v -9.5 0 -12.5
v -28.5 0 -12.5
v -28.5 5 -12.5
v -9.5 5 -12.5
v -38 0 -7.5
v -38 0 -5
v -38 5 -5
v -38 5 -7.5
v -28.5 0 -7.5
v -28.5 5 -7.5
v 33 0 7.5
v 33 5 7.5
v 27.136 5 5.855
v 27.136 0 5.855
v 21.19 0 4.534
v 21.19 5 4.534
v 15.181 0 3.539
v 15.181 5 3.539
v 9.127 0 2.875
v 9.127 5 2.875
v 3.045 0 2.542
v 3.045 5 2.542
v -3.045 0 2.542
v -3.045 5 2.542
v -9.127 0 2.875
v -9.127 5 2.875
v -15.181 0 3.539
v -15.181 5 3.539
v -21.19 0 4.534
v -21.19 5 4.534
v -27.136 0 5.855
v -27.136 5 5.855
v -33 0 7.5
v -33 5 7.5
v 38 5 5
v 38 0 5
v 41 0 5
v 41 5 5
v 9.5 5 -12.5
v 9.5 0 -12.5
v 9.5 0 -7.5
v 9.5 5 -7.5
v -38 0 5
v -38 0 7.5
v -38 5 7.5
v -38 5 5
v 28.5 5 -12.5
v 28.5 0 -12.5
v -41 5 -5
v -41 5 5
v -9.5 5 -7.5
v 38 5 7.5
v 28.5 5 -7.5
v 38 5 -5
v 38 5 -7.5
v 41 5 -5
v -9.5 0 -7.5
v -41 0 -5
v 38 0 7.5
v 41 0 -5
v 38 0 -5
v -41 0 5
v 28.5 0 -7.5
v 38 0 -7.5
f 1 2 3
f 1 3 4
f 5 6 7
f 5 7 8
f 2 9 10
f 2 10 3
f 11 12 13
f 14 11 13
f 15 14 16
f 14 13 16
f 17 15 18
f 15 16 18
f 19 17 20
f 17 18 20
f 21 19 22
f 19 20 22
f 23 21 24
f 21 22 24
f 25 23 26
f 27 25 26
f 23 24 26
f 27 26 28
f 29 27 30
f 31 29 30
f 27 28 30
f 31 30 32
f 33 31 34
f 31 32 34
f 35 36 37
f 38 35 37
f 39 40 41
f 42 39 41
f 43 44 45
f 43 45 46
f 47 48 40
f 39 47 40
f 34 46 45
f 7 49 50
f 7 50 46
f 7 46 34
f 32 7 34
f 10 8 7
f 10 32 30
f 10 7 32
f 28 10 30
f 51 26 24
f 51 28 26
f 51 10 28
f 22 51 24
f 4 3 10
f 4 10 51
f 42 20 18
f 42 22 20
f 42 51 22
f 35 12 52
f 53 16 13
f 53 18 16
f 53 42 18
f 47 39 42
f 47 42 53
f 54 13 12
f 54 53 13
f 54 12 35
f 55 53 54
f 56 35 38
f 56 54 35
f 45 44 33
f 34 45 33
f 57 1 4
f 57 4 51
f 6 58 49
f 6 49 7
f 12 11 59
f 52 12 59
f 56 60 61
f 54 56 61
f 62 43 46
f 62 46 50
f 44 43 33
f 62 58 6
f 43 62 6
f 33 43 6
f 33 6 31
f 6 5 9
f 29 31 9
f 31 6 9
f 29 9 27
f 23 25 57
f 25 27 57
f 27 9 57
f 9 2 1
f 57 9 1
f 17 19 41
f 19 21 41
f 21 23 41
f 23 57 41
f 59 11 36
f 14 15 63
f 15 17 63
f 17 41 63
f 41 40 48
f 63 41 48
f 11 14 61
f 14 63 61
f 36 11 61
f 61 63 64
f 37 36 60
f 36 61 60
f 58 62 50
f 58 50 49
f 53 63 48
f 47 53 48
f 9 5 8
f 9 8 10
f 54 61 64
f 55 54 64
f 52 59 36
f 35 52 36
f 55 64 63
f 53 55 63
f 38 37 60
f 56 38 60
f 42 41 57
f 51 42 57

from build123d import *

# Parameters (mm, degrees)
BOSS_EXTRUDE1_DEPTH = 5
CUT_EXTRUDE1_DEPTH  = 44.153794735


with BuildPart() as part:
    # Sketch1 → Boss-Extrude1 (new body)
    with BuildSketch(Plane(origin=(0, 0, 0), x_dir=(1, 0, 0), z_dir=(0, 1, 0))):
        Polygon((-41, -5), (-41, 5), (-38, 5), (-38, 7.5), (-28.5, 7.5), (-28.5, 12.5), (-9.5, 12.5), (-9.5, 7.5), (0, 7.5), (0, -7.5), (-38, -7.5), (-38, -5), align=None)
    boss_extrude1 = extrude(amount=BOSS_EXTRUDE1_DEPTH)

    # Mirror1: Boss-Extrude1 across plane
    add(boss_extrude1.mirror(Plane(origin=(0, 5, -7.5), x_dir=(0, 0, 1), z_dir=(-1, 0, 0))))

    # Sketch4 → Cut-Extrude1 (cut, through all)
    with BuildSketch(Plane(origin=(0, 5, 0), x_dir=(1, 0, 0), z_dir=(0, 1, 0))):
        with BuildLine():
            Line((-33, -7.5), (33, -7.5))
            ThreePointArc((33, -7.5), (0, -2.5), (-33, -7.5))
        make_face()
    extrude(amount=-CUT_EXTRUDE1_DEPTH, mode=Mode.SUBTRACT)


solid = part.part
